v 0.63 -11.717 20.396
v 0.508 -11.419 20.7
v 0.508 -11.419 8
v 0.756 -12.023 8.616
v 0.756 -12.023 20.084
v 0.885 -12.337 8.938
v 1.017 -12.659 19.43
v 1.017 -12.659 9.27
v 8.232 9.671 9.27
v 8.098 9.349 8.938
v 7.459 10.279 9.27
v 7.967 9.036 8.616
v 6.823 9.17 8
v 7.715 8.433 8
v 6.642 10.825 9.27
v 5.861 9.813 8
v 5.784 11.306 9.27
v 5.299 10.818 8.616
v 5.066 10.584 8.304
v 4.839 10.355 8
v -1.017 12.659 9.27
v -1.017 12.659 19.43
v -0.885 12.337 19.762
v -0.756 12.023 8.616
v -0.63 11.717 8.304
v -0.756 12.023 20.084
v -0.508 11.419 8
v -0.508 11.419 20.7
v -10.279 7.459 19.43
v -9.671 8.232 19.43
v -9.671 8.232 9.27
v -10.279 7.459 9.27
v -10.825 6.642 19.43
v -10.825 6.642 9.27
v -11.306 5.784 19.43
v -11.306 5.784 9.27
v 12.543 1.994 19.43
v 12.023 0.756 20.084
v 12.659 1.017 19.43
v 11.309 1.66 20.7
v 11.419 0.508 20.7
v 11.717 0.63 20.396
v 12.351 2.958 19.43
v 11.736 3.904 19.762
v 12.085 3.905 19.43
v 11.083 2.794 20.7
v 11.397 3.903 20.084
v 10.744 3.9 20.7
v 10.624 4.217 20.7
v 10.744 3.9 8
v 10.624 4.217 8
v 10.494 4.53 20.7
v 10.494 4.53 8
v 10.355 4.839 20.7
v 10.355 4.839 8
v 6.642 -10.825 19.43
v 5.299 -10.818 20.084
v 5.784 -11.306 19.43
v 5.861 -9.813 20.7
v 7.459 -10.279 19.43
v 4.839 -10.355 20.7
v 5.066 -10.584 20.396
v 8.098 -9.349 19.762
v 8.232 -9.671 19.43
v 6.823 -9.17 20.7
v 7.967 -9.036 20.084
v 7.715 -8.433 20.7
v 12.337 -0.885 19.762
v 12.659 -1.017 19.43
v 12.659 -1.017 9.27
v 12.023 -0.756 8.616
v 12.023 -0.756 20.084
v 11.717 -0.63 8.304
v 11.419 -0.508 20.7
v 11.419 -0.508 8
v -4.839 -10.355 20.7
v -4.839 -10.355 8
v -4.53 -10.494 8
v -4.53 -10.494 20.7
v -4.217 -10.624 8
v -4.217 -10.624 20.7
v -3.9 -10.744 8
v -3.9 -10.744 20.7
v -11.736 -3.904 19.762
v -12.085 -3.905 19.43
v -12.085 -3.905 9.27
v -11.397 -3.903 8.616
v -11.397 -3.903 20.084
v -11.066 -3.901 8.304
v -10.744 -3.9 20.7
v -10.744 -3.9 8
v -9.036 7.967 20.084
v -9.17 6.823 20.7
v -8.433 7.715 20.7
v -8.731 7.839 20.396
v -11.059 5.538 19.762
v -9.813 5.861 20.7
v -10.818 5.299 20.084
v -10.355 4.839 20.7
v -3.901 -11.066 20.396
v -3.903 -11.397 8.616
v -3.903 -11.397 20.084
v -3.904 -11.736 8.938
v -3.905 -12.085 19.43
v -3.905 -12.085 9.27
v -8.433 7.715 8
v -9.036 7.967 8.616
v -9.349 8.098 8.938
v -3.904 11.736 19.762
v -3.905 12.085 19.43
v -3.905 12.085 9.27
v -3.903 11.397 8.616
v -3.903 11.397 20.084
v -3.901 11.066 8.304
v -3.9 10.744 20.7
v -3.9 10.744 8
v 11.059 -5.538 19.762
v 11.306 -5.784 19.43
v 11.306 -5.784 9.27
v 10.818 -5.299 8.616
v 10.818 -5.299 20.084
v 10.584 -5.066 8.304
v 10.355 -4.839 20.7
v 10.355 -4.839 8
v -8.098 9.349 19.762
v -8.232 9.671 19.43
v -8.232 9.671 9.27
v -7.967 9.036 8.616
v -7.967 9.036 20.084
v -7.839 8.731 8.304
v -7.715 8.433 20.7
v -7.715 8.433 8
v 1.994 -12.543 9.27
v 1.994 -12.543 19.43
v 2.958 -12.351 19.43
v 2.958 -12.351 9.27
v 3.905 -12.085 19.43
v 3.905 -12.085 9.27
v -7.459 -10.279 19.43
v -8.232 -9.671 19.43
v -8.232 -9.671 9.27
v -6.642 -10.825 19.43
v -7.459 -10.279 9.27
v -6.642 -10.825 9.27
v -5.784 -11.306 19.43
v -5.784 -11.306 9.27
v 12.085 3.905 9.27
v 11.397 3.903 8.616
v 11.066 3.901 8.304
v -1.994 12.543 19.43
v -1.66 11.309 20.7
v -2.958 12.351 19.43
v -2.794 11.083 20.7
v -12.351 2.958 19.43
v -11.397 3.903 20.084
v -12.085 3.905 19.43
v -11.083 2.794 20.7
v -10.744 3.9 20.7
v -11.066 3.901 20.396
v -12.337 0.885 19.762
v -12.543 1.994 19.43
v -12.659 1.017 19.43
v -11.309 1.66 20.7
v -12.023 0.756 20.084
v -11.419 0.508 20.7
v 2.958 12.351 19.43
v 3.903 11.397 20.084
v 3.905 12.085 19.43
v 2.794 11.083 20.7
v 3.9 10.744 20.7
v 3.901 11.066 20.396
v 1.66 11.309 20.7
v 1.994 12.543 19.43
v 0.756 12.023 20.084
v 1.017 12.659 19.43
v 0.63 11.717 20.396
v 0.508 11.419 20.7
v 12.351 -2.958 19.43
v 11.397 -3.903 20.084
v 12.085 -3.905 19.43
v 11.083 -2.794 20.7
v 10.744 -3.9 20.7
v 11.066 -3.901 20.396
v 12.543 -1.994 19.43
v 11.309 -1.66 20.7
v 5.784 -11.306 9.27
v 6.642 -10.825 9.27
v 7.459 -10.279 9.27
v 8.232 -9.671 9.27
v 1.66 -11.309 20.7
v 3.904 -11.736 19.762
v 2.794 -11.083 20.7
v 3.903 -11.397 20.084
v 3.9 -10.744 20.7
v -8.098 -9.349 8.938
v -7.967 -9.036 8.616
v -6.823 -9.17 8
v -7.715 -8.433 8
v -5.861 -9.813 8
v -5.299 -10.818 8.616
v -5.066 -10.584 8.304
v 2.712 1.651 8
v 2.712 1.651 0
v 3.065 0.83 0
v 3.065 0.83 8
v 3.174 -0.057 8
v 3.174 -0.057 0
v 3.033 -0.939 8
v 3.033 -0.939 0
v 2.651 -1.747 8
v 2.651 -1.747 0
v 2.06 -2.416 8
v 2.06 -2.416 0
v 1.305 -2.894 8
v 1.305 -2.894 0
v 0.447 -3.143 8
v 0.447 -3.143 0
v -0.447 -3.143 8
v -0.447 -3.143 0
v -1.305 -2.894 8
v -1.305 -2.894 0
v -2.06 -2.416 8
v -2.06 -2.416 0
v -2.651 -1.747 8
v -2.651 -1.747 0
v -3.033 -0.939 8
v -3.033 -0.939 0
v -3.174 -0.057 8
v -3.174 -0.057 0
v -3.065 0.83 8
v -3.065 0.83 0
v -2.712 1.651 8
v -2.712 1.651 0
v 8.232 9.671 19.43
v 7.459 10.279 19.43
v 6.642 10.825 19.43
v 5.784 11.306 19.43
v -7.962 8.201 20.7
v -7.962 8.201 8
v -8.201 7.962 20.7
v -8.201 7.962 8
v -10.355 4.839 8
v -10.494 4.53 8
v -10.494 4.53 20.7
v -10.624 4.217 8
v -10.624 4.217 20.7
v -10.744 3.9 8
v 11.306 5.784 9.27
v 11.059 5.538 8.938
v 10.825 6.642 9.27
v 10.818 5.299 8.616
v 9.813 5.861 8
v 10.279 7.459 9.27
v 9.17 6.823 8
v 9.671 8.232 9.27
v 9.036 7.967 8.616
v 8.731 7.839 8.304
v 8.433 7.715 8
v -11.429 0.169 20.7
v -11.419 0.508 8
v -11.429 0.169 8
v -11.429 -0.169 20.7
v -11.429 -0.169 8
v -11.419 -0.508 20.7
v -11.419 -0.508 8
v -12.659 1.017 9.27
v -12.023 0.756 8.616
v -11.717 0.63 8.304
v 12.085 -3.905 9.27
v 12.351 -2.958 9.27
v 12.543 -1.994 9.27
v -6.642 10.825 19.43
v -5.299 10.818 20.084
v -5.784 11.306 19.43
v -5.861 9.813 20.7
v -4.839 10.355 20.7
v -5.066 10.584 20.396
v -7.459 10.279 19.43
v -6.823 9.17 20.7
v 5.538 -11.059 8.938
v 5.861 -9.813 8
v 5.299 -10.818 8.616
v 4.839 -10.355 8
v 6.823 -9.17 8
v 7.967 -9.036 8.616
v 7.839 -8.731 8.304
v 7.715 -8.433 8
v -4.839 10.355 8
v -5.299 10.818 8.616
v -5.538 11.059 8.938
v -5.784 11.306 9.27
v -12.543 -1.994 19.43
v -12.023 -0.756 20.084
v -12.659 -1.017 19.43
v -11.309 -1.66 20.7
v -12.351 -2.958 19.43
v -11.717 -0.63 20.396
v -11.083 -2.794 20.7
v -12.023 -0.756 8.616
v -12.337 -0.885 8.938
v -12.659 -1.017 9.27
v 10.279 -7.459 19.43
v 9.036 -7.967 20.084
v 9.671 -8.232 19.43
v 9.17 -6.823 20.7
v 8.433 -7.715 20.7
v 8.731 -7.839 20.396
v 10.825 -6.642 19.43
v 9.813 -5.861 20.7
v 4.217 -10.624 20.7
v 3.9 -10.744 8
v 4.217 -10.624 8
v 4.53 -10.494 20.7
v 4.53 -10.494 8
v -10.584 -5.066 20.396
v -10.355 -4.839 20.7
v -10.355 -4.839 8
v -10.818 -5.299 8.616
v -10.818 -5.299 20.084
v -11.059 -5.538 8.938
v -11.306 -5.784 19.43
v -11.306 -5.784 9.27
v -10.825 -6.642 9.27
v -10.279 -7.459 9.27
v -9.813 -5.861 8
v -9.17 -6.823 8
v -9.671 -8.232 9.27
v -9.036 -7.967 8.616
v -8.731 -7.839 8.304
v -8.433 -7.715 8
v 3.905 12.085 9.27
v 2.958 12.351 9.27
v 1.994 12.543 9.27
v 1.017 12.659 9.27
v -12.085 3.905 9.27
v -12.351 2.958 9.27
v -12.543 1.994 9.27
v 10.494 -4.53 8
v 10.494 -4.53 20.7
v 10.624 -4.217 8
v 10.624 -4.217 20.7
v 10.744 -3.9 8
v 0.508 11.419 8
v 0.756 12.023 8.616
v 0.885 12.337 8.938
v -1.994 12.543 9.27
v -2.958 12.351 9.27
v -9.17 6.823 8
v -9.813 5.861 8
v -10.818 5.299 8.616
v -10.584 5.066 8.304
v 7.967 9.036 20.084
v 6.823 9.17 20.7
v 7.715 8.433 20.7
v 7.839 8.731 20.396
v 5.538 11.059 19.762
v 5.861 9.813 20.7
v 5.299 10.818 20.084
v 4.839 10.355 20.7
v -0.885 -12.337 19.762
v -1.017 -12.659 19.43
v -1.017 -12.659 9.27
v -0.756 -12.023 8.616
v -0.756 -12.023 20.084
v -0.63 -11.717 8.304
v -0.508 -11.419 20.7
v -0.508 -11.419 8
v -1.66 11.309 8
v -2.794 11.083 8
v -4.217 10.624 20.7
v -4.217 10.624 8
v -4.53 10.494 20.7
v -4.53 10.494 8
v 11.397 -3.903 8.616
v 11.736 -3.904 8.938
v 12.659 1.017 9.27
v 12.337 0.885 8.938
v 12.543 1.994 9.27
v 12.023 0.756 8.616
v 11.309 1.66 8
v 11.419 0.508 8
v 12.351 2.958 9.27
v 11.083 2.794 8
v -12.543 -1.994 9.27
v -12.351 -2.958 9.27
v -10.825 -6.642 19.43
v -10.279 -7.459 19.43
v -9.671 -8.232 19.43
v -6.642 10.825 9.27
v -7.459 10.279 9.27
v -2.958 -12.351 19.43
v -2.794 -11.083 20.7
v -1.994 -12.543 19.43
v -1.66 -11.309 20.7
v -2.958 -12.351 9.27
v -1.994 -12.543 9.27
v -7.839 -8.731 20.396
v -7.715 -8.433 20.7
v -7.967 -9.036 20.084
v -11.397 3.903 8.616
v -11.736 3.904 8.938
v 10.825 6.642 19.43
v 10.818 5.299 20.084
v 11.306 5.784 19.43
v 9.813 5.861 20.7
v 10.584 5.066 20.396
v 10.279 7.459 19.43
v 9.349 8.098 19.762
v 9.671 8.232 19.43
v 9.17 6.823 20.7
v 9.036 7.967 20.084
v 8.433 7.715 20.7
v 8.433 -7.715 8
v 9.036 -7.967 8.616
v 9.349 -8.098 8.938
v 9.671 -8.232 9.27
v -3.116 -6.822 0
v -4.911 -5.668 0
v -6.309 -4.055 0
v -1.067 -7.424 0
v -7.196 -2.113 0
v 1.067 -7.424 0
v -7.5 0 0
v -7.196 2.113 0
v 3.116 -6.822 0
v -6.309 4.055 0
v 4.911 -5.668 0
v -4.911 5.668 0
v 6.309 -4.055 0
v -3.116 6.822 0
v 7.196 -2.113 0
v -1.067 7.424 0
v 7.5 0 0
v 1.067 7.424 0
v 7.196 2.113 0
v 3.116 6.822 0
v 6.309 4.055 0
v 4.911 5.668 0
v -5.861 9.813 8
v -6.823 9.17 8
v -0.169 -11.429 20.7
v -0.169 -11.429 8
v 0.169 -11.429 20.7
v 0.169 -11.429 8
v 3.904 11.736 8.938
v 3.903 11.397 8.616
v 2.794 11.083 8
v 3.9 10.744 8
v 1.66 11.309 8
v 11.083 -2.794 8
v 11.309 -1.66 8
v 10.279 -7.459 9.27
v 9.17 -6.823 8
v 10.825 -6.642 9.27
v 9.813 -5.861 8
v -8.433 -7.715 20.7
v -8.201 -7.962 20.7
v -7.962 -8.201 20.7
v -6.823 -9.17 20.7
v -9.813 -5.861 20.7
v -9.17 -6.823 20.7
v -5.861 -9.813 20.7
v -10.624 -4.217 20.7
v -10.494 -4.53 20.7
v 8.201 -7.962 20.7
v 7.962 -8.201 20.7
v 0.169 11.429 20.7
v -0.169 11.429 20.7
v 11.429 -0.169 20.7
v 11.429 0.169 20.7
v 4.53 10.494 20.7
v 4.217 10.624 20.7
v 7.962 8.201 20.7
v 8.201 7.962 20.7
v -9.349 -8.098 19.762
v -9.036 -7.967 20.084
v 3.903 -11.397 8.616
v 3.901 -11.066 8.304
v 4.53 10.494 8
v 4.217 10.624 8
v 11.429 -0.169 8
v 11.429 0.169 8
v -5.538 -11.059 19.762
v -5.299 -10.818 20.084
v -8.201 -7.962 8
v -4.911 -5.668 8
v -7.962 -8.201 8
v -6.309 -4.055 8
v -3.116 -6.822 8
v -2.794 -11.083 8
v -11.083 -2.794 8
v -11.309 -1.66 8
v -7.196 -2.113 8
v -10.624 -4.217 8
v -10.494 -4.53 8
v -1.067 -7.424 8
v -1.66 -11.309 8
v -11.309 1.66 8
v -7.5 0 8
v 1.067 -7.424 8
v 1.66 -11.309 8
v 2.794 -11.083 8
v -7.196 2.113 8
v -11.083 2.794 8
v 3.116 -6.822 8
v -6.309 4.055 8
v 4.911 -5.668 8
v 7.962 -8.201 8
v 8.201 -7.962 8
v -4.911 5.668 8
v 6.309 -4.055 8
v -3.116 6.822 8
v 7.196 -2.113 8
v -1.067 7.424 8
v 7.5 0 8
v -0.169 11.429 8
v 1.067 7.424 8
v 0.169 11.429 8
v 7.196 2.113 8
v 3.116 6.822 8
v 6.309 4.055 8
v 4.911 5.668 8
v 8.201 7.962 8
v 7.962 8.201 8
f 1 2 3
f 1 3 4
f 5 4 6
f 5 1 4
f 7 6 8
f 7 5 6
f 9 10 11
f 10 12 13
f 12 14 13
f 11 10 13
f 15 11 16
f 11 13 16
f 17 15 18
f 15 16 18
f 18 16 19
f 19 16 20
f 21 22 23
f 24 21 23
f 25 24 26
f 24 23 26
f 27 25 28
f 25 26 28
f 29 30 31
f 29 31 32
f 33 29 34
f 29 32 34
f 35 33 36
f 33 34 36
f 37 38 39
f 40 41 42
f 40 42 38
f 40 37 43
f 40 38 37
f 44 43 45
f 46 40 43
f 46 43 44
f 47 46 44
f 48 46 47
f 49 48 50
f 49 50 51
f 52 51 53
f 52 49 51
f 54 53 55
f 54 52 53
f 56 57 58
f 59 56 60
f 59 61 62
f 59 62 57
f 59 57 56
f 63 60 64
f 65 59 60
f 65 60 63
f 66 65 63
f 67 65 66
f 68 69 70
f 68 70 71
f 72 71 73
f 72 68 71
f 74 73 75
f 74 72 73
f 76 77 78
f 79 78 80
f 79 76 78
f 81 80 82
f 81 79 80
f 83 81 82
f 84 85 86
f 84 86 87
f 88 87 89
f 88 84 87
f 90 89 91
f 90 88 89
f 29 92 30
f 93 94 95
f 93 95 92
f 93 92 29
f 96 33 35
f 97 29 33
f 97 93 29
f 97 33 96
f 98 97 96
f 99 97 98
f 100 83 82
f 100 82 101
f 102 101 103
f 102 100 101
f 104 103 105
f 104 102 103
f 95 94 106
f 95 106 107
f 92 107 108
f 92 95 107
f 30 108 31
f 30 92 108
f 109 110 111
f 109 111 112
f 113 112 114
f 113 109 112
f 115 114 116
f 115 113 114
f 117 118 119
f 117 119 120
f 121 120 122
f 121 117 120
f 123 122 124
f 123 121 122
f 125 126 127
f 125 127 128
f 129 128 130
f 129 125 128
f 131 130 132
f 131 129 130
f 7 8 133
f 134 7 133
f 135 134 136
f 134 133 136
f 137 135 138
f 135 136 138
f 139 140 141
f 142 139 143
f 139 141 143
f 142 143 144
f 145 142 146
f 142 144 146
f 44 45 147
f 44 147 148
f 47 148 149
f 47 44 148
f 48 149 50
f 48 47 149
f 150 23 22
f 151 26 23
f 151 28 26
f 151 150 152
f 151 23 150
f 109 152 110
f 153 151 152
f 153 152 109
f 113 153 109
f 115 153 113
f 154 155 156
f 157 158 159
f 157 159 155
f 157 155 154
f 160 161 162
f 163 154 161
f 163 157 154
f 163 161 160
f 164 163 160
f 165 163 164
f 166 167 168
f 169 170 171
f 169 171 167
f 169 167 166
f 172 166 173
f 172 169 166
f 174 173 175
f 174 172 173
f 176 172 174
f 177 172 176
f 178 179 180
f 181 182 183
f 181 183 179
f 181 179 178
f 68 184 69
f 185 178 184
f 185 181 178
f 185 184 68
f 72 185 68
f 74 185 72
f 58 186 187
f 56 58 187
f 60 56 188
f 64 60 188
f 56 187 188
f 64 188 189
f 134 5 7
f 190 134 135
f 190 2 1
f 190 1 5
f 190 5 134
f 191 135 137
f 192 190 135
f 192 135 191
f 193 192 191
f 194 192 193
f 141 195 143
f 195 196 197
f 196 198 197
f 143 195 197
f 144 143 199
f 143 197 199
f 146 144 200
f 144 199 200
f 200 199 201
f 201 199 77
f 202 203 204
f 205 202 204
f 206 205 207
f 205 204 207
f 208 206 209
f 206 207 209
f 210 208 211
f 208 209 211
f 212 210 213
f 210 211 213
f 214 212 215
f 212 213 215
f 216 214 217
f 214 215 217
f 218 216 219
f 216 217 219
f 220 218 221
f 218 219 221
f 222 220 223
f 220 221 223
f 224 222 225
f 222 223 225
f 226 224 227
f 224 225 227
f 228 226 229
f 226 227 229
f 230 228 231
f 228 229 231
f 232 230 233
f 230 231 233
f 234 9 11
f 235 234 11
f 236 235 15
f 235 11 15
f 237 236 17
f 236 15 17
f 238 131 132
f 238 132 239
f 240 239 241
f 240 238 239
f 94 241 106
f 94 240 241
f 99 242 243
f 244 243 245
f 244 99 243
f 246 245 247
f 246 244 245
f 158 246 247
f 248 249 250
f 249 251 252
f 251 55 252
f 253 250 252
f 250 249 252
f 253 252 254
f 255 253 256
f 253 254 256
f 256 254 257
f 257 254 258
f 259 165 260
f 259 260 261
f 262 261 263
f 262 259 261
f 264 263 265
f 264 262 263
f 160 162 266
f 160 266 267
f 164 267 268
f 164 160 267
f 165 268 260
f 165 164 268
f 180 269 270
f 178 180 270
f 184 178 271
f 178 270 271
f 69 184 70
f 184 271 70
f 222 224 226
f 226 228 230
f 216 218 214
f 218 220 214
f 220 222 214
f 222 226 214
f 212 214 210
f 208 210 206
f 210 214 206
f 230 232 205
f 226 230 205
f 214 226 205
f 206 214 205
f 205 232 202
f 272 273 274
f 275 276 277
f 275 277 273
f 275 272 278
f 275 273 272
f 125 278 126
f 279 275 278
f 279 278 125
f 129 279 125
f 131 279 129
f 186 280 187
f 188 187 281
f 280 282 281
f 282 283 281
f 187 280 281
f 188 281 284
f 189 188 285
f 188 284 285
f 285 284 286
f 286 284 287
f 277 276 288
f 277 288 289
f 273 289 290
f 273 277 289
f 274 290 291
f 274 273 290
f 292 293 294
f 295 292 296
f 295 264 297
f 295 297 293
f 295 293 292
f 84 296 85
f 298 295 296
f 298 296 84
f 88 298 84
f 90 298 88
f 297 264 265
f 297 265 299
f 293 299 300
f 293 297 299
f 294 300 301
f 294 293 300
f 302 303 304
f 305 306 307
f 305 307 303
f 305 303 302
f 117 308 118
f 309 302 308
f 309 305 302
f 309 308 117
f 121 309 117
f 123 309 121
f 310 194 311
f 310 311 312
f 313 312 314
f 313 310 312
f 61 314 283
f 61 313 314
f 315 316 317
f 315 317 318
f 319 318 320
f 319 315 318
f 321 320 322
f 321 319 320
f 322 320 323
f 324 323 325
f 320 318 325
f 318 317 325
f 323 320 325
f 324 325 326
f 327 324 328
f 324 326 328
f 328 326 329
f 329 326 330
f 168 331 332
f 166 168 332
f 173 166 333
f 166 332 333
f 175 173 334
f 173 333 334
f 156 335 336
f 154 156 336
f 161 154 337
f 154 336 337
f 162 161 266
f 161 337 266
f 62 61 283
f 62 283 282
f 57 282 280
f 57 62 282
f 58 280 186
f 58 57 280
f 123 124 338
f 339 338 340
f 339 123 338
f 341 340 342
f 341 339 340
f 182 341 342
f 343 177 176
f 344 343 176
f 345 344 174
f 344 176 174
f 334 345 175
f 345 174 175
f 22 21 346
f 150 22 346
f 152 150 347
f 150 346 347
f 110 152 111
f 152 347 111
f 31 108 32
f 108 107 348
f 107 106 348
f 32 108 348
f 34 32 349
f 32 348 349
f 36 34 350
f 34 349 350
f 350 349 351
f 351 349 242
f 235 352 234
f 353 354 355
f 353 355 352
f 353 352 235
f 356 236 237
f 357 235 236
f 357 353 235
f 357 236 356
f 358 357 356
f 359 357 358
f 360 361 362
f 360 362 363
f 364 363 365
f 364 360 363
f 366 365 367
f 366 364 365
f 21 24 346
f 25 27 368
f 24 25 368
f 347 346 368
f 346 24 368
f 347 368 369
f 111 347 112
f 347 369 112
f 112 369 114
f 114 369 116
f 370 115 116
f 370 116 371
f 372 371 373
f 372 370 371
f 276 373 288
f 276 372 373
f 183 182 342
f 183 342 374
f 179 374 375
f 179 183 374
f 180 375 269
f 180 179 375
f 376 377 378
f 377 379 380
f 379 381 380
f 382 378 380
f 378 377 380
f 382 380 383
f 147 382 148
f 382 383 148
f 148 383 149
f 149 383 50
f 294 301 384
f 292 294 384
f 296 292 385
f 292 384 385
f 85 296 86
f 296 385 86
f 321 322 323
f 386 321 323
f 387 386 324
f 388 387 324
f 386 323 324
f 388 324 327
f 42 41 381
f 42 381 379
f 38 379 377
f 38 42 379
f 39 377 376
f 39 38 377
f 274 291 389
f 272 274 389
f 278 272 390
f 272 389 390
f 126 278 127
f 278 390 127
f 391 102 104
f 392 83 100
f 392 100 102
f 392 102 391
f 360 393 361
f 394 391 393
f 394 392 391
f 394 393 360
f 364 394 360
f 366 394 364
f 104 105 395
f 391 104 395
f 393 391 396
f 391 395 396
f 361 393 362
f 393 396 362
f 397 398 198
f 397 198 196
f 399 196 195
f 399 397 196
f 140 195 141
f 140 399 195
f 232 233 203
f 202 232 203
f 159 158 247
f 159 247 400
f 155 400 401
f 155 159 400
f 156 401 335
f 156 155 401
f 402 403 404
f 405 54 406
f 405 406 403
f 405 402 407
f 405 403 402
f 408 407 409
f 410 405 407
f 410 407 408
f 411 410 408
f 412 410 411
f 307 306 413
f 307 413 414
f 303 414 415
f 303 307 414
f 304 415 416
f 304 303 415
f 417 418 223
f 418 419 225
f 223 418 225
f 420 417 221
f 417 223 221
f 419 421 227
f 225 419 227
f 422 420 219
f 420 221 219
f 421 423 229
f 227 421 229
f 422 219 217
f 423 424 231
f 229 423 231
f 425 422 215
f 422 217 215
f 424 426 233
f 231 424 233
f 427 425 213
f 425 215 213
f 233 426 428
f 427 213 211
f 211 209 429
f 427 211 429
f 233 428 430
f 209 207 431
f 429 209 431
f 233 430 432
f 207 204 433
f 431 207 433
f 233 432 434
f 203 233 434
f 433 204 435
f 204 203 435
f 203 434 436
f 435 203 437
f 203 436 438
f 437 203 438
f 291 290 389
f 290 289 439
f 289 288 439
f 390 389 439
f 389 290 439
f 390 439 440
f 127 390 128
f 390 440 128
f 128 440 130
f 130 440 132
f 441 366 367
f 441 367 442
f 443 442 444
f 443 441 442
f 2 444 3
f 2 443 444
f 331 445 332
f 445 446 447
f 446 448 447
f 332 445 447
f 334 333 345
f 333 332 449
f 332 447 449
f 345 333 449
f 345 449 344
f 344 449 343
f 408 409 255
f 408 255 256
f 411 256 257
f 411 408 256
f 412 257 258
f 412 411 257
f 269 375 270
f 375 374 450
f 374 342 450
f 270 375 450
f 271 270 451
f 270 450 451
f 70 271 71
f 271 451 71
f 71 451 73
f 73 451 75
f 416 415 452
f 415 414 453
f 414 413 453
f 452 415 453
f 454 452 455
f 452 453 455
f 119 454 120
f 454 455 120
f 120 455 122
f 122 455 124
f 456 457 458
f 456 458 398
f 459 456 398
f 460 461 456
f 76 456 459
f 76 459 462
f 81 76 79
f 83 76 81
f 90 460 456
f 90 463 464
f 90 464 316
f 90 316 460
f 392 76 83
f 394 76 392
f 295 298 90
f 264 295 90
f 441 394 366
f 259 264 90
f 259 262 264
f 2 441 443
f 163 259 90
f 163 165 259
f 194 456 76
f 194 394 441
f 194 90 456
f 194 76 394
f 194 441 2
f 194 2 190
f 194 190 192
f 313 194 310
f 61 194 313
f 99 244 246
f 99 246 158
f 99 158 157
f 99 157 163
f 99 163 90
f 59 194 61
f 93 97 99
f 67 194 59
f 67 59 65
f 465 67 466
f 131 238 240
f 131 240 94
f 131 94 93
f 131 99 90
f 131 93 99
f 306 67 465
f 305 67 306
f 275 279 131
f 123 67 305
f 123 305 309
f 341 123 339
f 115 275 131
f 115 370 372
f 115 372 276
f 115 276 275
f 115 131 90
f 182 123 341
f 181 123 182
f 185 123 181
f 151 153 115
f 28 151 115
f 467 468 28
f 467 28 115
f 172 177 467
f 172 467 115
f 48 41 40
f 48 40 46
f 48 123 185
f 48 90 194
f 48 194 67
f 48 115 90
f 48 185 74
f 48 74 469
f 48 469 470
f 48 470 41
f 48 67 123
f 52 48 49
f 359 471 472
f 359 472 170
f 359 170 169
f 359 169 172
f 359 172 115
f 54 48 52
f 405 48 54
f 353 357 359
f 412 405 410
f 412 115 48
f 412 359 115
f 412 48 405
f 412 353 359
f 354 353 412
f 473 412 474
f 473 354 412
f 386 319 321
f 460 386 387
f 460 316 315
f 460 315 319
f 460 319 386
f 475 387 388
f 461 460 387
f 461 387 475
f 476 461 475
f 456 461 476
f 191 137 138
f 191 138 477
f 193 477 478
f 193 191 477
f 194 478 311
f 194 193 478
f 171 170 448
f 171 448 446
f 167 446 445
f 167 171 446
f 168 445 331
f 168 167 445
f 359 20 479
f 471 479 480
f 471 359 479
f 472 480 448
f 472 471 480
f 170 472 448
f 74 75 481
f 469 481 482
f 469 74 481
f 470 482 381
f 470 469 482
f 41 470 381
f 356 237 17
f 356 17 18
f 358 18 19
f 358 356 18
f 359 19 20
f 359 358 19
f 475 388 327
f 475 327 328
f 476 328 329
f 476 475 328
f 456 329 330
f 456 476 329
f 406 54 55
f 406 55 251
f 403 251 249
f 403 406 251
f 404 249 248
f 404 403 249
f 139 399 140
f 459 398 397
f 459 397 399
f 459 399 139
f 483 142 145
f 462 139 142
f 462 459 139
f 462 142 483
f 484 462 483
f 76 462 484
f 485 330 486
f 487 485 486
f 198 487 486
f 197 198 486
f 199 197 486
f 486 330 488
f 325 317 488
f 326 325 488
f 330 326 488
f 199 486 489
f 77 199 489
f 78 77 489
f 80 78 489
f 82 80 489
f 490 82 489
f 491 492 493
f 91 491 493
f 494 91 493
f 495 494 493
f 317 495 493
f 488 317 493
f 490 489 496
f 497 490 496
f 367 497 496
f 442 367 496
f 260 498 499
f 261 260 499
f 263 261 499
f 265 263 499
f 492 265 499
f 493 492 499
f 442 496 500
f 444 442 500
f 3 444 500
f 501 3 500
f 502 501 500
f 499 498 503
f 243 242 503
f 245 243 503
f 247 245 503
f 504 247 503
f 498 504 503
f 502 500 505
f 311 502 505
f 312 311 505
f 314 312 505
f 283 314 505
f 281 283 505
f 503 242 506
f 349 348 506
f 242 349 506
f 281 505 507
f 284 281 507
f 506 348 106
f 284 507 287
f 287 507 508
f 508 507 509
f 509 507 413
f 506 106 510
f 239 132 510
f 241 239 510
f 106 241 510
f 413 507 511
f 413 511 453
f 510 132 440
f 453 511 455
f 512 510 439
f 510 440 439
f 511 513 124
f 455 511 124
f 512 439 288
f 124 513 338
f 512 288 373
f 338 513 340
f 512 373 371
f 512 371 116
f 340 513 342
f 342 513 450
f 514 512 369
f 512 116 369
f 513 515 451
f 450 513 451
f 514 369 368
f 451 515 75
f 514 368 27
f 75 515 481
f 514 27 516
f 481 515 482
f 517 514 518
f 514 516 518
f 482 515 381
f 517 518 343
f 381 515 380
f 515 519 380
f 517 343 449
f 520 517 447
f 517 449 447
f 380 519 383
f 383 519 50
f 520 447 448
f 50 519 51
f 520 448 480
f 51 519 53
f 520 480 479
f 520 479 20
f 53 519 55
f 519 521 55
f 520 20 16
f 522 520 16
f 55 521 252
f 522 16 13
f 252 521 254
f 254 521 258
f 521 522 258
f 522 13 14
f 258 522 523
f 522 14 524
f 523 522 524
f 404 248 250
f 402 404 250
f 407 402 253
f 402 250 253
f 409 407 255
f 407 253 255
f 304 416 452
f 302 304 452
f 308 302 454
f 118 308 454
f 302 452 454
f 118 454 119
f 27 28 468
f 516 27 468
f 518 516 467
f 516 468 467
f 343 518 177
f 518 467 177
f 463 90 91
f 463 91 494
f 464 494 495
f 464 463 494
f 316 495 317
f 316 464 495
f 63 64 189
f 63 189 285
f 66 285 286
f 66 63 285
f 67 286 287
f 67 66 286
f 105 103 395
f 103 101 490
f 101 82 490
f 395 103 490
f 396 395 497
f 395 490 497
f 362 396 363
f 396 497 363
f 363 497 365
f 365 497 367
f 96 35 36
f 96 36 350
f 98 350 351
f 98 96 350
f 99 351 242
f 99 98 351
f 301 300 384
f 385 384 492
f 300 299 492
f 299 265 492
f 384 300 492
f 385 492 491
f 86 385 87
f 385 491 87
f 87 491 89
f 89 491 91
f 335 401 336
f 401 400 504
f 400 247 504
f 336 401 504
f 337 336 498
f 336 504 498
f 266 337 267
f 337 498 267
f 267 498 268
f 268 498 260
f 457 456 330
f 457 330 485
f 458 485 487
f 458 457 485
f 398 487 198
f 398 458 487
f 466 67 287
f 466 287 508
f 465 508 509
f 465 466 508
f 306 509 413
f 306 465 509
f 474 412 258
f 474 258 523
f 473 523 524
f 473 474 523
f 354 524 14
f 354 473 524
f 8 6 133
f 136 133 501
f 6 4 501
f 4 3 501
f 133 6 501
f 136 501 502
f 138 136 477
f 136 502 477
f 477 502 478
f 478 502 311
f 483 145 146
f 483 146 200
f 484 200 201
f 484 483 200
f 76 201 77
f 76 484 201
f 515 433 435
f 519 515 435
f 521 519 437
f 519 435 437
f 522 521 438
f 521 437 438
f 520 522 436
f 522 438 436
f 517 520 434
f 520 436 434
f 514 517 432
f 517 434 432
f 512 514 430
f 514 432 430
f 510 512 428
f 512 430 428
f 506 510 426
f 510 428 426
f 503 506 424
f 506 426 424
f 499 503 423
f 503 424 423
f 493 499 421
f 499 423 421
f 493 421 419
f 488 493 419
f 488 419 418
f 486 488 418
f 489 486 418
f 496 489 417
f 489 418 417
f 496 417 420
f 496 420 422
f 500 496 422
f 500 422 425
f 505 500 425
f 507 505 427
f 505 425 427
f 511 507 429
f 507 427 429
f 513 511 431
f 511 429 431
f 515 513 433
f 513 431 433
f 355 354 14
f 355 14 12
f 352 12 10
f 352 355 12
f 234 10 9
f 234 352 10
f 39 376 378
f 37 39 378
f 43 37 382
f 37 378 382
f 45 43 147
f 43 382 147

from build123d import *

# Parameters (mm, degrees)
SKETCH1_R           = 7.5
BOSS_EXTRUDE1_DEPTH = 8
SKETCH2_R           = 12.7
BOSS_EXTRUDE2_DEPTH = 12.7
CHAMFER1_SIZE       = 1.27
CUT_EXTRUDE2_DEPTH  = 12.7


with BuildPart() as part:
    # Sketch1 → Boss-Extrude1 (new body)
    with BuildSketch(Plane.XY):
        Circle(SKETCH1_R)
        with BuildLine():
            Line((-2.711977876, 1.651), (2.711977876, 1.651))
            ThreePointArc((2.711977876, 1.651), (0, -3.175), (-2.711977876, 1.651))
        make_face(mode=Mode.SUBTRACT)
    extrude(amount=BOSS_EXTRUDE1_DEPTH)

    # Sketch2 → Boss-Extrude2 (add)
    with BuildSketch(Plane.XY.offset(8)):
        Circle(SKETCH2_R)
    extrude(amount=BOSS_EXTRUDE2_DEPTH)

    # Chamfer1
    chamfer1_edges = [part.edges().sort_by_distance(p)[0] for p in [
        (-12.7, 0, 8),
        (-12.7, 0, 20.7),
    ]]
    chamfer(chamfer1_edges, length=CHAMFER1_SIZE)

    # Sketch3 → Cut-Extrude2 (cut)
    with BuildSketch(Plane.XY.offset(20.7)):
        with BuildLine():
            Line((-1.494578623, 13.823081897), (-0.508, 11.418705531))
            ThreePointArc((-0.508, 11.418705531), (0, 11.43), (0.508, 11.418705531))
            Line((0.508, 11.418705531), (1.494578623, 13.823081897))
            Line((1.494578623, 13.823081897), (-1.494578623, 13.823081897))
        make_face()
        with BuildLine():
            Line((3.909053826, 13.342812918), (6.670675026, 12.198911963))
            Line((6.670675026, 12.198911963), (4.839080228, 10.355105144))
            ThreePointArc((4.839080228, 10.355105144), (4.374071632, 10.559943057), (3.900418623, 10.743911511))
            Line((3.900418623, 10.743911511), (3.909053826, 13.342812918))
        make_face()
        with BuildLine():
            Line((8.717568266, 10.831221626), (10.831221626, 8.717568266))
            Line((10.831221626, 8.717568266), (8.433454358, 7.715033868))
            ThreePointArc((8.433454358, 7.715033868), (8.082230509, 8.082230509), (7.715033868, 8.433454358))
            Line((7.715033868, 8.433454358), (8.717568266, 10.831221626))
        make_face()
        with BuildLine():
            Line((12.198911963, 6.670675026), (13.342812918, 3.909053826))
            Line((13.342812918, 3.909053826), (10.743911511, 3.900418623))
            ThreePointArc((10.743911511, 3.900418623), (10.559943057, 4.374071632), (10.355105144, 4.839080228))
            Line((10.355105144, 4.839080228), (12.198911963, 6.670675026))
        make_face()
        with BuildLine():
            Line((13.823081897, 1.494578623), (13.823081897, -1.494578623))
            Line((13.823081897, -1.494578623), (11.418705531, -0.508))
            ThreePointArc((11.418705531, -0.508), (11.43, 0), (11.418705531, 0.508))
            Line((11.418705531, 0.508), (13.823081897, 1.494578623))
        make_face()
        with BuildLine():
            Line((13.342812918, -3.909053826), (12.198911963, -6.670675026))
            Line((12.198911963, -6.670675026), (10.355105144, -4.839080228))
            ThreePointArc((10.355105144, -4.839080228), (10.559943057, -4.374071632), (10.743911511, -3.900418623))
            Line((10.743911511, -3.900418623), (13.342812918, -3.909053826))
        make_face()
        with BuildLine():
            Line((10.831221626, -8.717568266), (8.717568266, -10.831221626))
            Line((8.717568266, -10.831221626), (7.715033868, -8.433454358))
            ThreePointArc((7.715033868, -8.433454358), (8.082230509, -8.082230509), (8.433454358, -7.715033868))
            Line((8.433454358, -7.715033868), (10.831221626, -8.717568266))
        make_face()
        with BuildLine():
            Line((6.670675026, -12.198911963), (3.909053826, -13.342812918))
            Line((3.909053826, -13.342812918), (3.900418623, -10.743911511))
            ThreePointArc((3.900418623, -10.743911511), (4.374071632, -10.559943057), (4.839080228, -10.355105144))
            Line((4.839080228, -10.355105144), (6.670675026, -12.198911963))
        make_face()
        with BuildLine():
            Line((1.494578623, -13.823081897), (-1.494578623, -13.823081897))
            Line((-1.494578623, -13.823081897), (-0.508, -11.418705531))
            ThreePointArc((-0.508, -11.418705531), (0, -11.43), (0.508, -11.418705531))
            Line((0.508, -11.418705531), (1.494578623, -13.823081897))
        make_face()
        with BuildLine():
            Line((-3.909053826, -13.342812918), (-6.670675026, -12.198911963))
            Line((-6.670675026, -12.198911963), (-4.839080228, -10.355105144))
            ThreePointArc((-4.839080228, -10.355105144), (-4.374071632, -10.559943057), (-3.900418623, -10.743911511))
            Line((-3.900418623, -10.743911511), (-3.909053826, -13.342812918))
        make_face()
        with BuildLine():
            Line((-8.717568266, -10.831221626), (-10.831221626, -8.717568266))
            Line((-10.831221626, -8.717568266), (-8.433454358, -7.715033868))
            ThreePointArc((-8.433454358, -7.715033868), (-8.082230509, -8.082230509), (-7.715033868, -8.433454358))
            Line((-7.715033868, -8.433454358), (-8.717568266, -10.831221626))
        make_face()
        with BuildLine():
            Line((-12.198911963, -6.670675026), (-13.342812918, -3.909053826))
            Line((-13.342812918, -3.909053826), (-10.743911511, -3.900418623))
            ThreePointArc((-10.743911511, -3.900418623), (-10.559943057, -4.374071632), (-10.355105144, -4.839080228))
            Line((-10.355105144, -4.839080228), (-12.198911963, -6.670675026))
        make_face()
        with BuildLine():
            Line((-13.823081897, -1.494578623), (-13.823081897, 1.494578623))
            Line((-13.823081897, 1.494578623), (-11.418705531, 0.508))
            ThreePointArc((-11.418705531, 0.508), (-11.43, 0), (-11.418705531, -0.508))
            Line((-11.418705531, -0.508), (-13.823081897, -1.494578623))
        make_face()
        with BuildLine():
            Line((-13.342812918, 3.909053826), (-12.198911963, 6.670675026))
            Line((-12.198911963, 6.670675026), (-10.355105144, 4.839080228))
            ThreePointArc((-10.355105144, 4.839080228), (-10.559943057, 4.374071632), (-10.743911511, 3.900418623))
            Line((-10.743911511, 3.900418623), (-13.342812918, 3.909053826))
        make_face()
        with BuildLine():
            Line((-10.831221626, 8.717568266), (-8.717568266, 10.831221626))
            Line((-8.717568266, 10.831221626), (-7.715033868, 8.433454358))
            ThreePointArc((-7.715033868, 8.433454358), (-8.082230509, 8.082230509), (-8.433454358, 7.715033868))
            Line((-8.433454358, 7.715033868), (-10.831221626, 8.717568266))
        make_face()
        with BuildLine():
            Line((-6.670675026, 12.198911963), (-3.909053826, 13.342812918))
            Line((-3.909053826, 13.342812918), (-3.900418623, 10.743911511))
            ThreePointArc((-3.900418623, 10.743911511), (-4.374071632, 10.559943057), (-4.839080228, 10.355105144))
            Line((-4.839080228, 10.355105144), (-6.670675026, 12.198911963))
        make_face()
    extrude(amount=-CUT_EXTRUDE2_DEPTH, mode=Mode.SUBTRACT)


solid = part.part
